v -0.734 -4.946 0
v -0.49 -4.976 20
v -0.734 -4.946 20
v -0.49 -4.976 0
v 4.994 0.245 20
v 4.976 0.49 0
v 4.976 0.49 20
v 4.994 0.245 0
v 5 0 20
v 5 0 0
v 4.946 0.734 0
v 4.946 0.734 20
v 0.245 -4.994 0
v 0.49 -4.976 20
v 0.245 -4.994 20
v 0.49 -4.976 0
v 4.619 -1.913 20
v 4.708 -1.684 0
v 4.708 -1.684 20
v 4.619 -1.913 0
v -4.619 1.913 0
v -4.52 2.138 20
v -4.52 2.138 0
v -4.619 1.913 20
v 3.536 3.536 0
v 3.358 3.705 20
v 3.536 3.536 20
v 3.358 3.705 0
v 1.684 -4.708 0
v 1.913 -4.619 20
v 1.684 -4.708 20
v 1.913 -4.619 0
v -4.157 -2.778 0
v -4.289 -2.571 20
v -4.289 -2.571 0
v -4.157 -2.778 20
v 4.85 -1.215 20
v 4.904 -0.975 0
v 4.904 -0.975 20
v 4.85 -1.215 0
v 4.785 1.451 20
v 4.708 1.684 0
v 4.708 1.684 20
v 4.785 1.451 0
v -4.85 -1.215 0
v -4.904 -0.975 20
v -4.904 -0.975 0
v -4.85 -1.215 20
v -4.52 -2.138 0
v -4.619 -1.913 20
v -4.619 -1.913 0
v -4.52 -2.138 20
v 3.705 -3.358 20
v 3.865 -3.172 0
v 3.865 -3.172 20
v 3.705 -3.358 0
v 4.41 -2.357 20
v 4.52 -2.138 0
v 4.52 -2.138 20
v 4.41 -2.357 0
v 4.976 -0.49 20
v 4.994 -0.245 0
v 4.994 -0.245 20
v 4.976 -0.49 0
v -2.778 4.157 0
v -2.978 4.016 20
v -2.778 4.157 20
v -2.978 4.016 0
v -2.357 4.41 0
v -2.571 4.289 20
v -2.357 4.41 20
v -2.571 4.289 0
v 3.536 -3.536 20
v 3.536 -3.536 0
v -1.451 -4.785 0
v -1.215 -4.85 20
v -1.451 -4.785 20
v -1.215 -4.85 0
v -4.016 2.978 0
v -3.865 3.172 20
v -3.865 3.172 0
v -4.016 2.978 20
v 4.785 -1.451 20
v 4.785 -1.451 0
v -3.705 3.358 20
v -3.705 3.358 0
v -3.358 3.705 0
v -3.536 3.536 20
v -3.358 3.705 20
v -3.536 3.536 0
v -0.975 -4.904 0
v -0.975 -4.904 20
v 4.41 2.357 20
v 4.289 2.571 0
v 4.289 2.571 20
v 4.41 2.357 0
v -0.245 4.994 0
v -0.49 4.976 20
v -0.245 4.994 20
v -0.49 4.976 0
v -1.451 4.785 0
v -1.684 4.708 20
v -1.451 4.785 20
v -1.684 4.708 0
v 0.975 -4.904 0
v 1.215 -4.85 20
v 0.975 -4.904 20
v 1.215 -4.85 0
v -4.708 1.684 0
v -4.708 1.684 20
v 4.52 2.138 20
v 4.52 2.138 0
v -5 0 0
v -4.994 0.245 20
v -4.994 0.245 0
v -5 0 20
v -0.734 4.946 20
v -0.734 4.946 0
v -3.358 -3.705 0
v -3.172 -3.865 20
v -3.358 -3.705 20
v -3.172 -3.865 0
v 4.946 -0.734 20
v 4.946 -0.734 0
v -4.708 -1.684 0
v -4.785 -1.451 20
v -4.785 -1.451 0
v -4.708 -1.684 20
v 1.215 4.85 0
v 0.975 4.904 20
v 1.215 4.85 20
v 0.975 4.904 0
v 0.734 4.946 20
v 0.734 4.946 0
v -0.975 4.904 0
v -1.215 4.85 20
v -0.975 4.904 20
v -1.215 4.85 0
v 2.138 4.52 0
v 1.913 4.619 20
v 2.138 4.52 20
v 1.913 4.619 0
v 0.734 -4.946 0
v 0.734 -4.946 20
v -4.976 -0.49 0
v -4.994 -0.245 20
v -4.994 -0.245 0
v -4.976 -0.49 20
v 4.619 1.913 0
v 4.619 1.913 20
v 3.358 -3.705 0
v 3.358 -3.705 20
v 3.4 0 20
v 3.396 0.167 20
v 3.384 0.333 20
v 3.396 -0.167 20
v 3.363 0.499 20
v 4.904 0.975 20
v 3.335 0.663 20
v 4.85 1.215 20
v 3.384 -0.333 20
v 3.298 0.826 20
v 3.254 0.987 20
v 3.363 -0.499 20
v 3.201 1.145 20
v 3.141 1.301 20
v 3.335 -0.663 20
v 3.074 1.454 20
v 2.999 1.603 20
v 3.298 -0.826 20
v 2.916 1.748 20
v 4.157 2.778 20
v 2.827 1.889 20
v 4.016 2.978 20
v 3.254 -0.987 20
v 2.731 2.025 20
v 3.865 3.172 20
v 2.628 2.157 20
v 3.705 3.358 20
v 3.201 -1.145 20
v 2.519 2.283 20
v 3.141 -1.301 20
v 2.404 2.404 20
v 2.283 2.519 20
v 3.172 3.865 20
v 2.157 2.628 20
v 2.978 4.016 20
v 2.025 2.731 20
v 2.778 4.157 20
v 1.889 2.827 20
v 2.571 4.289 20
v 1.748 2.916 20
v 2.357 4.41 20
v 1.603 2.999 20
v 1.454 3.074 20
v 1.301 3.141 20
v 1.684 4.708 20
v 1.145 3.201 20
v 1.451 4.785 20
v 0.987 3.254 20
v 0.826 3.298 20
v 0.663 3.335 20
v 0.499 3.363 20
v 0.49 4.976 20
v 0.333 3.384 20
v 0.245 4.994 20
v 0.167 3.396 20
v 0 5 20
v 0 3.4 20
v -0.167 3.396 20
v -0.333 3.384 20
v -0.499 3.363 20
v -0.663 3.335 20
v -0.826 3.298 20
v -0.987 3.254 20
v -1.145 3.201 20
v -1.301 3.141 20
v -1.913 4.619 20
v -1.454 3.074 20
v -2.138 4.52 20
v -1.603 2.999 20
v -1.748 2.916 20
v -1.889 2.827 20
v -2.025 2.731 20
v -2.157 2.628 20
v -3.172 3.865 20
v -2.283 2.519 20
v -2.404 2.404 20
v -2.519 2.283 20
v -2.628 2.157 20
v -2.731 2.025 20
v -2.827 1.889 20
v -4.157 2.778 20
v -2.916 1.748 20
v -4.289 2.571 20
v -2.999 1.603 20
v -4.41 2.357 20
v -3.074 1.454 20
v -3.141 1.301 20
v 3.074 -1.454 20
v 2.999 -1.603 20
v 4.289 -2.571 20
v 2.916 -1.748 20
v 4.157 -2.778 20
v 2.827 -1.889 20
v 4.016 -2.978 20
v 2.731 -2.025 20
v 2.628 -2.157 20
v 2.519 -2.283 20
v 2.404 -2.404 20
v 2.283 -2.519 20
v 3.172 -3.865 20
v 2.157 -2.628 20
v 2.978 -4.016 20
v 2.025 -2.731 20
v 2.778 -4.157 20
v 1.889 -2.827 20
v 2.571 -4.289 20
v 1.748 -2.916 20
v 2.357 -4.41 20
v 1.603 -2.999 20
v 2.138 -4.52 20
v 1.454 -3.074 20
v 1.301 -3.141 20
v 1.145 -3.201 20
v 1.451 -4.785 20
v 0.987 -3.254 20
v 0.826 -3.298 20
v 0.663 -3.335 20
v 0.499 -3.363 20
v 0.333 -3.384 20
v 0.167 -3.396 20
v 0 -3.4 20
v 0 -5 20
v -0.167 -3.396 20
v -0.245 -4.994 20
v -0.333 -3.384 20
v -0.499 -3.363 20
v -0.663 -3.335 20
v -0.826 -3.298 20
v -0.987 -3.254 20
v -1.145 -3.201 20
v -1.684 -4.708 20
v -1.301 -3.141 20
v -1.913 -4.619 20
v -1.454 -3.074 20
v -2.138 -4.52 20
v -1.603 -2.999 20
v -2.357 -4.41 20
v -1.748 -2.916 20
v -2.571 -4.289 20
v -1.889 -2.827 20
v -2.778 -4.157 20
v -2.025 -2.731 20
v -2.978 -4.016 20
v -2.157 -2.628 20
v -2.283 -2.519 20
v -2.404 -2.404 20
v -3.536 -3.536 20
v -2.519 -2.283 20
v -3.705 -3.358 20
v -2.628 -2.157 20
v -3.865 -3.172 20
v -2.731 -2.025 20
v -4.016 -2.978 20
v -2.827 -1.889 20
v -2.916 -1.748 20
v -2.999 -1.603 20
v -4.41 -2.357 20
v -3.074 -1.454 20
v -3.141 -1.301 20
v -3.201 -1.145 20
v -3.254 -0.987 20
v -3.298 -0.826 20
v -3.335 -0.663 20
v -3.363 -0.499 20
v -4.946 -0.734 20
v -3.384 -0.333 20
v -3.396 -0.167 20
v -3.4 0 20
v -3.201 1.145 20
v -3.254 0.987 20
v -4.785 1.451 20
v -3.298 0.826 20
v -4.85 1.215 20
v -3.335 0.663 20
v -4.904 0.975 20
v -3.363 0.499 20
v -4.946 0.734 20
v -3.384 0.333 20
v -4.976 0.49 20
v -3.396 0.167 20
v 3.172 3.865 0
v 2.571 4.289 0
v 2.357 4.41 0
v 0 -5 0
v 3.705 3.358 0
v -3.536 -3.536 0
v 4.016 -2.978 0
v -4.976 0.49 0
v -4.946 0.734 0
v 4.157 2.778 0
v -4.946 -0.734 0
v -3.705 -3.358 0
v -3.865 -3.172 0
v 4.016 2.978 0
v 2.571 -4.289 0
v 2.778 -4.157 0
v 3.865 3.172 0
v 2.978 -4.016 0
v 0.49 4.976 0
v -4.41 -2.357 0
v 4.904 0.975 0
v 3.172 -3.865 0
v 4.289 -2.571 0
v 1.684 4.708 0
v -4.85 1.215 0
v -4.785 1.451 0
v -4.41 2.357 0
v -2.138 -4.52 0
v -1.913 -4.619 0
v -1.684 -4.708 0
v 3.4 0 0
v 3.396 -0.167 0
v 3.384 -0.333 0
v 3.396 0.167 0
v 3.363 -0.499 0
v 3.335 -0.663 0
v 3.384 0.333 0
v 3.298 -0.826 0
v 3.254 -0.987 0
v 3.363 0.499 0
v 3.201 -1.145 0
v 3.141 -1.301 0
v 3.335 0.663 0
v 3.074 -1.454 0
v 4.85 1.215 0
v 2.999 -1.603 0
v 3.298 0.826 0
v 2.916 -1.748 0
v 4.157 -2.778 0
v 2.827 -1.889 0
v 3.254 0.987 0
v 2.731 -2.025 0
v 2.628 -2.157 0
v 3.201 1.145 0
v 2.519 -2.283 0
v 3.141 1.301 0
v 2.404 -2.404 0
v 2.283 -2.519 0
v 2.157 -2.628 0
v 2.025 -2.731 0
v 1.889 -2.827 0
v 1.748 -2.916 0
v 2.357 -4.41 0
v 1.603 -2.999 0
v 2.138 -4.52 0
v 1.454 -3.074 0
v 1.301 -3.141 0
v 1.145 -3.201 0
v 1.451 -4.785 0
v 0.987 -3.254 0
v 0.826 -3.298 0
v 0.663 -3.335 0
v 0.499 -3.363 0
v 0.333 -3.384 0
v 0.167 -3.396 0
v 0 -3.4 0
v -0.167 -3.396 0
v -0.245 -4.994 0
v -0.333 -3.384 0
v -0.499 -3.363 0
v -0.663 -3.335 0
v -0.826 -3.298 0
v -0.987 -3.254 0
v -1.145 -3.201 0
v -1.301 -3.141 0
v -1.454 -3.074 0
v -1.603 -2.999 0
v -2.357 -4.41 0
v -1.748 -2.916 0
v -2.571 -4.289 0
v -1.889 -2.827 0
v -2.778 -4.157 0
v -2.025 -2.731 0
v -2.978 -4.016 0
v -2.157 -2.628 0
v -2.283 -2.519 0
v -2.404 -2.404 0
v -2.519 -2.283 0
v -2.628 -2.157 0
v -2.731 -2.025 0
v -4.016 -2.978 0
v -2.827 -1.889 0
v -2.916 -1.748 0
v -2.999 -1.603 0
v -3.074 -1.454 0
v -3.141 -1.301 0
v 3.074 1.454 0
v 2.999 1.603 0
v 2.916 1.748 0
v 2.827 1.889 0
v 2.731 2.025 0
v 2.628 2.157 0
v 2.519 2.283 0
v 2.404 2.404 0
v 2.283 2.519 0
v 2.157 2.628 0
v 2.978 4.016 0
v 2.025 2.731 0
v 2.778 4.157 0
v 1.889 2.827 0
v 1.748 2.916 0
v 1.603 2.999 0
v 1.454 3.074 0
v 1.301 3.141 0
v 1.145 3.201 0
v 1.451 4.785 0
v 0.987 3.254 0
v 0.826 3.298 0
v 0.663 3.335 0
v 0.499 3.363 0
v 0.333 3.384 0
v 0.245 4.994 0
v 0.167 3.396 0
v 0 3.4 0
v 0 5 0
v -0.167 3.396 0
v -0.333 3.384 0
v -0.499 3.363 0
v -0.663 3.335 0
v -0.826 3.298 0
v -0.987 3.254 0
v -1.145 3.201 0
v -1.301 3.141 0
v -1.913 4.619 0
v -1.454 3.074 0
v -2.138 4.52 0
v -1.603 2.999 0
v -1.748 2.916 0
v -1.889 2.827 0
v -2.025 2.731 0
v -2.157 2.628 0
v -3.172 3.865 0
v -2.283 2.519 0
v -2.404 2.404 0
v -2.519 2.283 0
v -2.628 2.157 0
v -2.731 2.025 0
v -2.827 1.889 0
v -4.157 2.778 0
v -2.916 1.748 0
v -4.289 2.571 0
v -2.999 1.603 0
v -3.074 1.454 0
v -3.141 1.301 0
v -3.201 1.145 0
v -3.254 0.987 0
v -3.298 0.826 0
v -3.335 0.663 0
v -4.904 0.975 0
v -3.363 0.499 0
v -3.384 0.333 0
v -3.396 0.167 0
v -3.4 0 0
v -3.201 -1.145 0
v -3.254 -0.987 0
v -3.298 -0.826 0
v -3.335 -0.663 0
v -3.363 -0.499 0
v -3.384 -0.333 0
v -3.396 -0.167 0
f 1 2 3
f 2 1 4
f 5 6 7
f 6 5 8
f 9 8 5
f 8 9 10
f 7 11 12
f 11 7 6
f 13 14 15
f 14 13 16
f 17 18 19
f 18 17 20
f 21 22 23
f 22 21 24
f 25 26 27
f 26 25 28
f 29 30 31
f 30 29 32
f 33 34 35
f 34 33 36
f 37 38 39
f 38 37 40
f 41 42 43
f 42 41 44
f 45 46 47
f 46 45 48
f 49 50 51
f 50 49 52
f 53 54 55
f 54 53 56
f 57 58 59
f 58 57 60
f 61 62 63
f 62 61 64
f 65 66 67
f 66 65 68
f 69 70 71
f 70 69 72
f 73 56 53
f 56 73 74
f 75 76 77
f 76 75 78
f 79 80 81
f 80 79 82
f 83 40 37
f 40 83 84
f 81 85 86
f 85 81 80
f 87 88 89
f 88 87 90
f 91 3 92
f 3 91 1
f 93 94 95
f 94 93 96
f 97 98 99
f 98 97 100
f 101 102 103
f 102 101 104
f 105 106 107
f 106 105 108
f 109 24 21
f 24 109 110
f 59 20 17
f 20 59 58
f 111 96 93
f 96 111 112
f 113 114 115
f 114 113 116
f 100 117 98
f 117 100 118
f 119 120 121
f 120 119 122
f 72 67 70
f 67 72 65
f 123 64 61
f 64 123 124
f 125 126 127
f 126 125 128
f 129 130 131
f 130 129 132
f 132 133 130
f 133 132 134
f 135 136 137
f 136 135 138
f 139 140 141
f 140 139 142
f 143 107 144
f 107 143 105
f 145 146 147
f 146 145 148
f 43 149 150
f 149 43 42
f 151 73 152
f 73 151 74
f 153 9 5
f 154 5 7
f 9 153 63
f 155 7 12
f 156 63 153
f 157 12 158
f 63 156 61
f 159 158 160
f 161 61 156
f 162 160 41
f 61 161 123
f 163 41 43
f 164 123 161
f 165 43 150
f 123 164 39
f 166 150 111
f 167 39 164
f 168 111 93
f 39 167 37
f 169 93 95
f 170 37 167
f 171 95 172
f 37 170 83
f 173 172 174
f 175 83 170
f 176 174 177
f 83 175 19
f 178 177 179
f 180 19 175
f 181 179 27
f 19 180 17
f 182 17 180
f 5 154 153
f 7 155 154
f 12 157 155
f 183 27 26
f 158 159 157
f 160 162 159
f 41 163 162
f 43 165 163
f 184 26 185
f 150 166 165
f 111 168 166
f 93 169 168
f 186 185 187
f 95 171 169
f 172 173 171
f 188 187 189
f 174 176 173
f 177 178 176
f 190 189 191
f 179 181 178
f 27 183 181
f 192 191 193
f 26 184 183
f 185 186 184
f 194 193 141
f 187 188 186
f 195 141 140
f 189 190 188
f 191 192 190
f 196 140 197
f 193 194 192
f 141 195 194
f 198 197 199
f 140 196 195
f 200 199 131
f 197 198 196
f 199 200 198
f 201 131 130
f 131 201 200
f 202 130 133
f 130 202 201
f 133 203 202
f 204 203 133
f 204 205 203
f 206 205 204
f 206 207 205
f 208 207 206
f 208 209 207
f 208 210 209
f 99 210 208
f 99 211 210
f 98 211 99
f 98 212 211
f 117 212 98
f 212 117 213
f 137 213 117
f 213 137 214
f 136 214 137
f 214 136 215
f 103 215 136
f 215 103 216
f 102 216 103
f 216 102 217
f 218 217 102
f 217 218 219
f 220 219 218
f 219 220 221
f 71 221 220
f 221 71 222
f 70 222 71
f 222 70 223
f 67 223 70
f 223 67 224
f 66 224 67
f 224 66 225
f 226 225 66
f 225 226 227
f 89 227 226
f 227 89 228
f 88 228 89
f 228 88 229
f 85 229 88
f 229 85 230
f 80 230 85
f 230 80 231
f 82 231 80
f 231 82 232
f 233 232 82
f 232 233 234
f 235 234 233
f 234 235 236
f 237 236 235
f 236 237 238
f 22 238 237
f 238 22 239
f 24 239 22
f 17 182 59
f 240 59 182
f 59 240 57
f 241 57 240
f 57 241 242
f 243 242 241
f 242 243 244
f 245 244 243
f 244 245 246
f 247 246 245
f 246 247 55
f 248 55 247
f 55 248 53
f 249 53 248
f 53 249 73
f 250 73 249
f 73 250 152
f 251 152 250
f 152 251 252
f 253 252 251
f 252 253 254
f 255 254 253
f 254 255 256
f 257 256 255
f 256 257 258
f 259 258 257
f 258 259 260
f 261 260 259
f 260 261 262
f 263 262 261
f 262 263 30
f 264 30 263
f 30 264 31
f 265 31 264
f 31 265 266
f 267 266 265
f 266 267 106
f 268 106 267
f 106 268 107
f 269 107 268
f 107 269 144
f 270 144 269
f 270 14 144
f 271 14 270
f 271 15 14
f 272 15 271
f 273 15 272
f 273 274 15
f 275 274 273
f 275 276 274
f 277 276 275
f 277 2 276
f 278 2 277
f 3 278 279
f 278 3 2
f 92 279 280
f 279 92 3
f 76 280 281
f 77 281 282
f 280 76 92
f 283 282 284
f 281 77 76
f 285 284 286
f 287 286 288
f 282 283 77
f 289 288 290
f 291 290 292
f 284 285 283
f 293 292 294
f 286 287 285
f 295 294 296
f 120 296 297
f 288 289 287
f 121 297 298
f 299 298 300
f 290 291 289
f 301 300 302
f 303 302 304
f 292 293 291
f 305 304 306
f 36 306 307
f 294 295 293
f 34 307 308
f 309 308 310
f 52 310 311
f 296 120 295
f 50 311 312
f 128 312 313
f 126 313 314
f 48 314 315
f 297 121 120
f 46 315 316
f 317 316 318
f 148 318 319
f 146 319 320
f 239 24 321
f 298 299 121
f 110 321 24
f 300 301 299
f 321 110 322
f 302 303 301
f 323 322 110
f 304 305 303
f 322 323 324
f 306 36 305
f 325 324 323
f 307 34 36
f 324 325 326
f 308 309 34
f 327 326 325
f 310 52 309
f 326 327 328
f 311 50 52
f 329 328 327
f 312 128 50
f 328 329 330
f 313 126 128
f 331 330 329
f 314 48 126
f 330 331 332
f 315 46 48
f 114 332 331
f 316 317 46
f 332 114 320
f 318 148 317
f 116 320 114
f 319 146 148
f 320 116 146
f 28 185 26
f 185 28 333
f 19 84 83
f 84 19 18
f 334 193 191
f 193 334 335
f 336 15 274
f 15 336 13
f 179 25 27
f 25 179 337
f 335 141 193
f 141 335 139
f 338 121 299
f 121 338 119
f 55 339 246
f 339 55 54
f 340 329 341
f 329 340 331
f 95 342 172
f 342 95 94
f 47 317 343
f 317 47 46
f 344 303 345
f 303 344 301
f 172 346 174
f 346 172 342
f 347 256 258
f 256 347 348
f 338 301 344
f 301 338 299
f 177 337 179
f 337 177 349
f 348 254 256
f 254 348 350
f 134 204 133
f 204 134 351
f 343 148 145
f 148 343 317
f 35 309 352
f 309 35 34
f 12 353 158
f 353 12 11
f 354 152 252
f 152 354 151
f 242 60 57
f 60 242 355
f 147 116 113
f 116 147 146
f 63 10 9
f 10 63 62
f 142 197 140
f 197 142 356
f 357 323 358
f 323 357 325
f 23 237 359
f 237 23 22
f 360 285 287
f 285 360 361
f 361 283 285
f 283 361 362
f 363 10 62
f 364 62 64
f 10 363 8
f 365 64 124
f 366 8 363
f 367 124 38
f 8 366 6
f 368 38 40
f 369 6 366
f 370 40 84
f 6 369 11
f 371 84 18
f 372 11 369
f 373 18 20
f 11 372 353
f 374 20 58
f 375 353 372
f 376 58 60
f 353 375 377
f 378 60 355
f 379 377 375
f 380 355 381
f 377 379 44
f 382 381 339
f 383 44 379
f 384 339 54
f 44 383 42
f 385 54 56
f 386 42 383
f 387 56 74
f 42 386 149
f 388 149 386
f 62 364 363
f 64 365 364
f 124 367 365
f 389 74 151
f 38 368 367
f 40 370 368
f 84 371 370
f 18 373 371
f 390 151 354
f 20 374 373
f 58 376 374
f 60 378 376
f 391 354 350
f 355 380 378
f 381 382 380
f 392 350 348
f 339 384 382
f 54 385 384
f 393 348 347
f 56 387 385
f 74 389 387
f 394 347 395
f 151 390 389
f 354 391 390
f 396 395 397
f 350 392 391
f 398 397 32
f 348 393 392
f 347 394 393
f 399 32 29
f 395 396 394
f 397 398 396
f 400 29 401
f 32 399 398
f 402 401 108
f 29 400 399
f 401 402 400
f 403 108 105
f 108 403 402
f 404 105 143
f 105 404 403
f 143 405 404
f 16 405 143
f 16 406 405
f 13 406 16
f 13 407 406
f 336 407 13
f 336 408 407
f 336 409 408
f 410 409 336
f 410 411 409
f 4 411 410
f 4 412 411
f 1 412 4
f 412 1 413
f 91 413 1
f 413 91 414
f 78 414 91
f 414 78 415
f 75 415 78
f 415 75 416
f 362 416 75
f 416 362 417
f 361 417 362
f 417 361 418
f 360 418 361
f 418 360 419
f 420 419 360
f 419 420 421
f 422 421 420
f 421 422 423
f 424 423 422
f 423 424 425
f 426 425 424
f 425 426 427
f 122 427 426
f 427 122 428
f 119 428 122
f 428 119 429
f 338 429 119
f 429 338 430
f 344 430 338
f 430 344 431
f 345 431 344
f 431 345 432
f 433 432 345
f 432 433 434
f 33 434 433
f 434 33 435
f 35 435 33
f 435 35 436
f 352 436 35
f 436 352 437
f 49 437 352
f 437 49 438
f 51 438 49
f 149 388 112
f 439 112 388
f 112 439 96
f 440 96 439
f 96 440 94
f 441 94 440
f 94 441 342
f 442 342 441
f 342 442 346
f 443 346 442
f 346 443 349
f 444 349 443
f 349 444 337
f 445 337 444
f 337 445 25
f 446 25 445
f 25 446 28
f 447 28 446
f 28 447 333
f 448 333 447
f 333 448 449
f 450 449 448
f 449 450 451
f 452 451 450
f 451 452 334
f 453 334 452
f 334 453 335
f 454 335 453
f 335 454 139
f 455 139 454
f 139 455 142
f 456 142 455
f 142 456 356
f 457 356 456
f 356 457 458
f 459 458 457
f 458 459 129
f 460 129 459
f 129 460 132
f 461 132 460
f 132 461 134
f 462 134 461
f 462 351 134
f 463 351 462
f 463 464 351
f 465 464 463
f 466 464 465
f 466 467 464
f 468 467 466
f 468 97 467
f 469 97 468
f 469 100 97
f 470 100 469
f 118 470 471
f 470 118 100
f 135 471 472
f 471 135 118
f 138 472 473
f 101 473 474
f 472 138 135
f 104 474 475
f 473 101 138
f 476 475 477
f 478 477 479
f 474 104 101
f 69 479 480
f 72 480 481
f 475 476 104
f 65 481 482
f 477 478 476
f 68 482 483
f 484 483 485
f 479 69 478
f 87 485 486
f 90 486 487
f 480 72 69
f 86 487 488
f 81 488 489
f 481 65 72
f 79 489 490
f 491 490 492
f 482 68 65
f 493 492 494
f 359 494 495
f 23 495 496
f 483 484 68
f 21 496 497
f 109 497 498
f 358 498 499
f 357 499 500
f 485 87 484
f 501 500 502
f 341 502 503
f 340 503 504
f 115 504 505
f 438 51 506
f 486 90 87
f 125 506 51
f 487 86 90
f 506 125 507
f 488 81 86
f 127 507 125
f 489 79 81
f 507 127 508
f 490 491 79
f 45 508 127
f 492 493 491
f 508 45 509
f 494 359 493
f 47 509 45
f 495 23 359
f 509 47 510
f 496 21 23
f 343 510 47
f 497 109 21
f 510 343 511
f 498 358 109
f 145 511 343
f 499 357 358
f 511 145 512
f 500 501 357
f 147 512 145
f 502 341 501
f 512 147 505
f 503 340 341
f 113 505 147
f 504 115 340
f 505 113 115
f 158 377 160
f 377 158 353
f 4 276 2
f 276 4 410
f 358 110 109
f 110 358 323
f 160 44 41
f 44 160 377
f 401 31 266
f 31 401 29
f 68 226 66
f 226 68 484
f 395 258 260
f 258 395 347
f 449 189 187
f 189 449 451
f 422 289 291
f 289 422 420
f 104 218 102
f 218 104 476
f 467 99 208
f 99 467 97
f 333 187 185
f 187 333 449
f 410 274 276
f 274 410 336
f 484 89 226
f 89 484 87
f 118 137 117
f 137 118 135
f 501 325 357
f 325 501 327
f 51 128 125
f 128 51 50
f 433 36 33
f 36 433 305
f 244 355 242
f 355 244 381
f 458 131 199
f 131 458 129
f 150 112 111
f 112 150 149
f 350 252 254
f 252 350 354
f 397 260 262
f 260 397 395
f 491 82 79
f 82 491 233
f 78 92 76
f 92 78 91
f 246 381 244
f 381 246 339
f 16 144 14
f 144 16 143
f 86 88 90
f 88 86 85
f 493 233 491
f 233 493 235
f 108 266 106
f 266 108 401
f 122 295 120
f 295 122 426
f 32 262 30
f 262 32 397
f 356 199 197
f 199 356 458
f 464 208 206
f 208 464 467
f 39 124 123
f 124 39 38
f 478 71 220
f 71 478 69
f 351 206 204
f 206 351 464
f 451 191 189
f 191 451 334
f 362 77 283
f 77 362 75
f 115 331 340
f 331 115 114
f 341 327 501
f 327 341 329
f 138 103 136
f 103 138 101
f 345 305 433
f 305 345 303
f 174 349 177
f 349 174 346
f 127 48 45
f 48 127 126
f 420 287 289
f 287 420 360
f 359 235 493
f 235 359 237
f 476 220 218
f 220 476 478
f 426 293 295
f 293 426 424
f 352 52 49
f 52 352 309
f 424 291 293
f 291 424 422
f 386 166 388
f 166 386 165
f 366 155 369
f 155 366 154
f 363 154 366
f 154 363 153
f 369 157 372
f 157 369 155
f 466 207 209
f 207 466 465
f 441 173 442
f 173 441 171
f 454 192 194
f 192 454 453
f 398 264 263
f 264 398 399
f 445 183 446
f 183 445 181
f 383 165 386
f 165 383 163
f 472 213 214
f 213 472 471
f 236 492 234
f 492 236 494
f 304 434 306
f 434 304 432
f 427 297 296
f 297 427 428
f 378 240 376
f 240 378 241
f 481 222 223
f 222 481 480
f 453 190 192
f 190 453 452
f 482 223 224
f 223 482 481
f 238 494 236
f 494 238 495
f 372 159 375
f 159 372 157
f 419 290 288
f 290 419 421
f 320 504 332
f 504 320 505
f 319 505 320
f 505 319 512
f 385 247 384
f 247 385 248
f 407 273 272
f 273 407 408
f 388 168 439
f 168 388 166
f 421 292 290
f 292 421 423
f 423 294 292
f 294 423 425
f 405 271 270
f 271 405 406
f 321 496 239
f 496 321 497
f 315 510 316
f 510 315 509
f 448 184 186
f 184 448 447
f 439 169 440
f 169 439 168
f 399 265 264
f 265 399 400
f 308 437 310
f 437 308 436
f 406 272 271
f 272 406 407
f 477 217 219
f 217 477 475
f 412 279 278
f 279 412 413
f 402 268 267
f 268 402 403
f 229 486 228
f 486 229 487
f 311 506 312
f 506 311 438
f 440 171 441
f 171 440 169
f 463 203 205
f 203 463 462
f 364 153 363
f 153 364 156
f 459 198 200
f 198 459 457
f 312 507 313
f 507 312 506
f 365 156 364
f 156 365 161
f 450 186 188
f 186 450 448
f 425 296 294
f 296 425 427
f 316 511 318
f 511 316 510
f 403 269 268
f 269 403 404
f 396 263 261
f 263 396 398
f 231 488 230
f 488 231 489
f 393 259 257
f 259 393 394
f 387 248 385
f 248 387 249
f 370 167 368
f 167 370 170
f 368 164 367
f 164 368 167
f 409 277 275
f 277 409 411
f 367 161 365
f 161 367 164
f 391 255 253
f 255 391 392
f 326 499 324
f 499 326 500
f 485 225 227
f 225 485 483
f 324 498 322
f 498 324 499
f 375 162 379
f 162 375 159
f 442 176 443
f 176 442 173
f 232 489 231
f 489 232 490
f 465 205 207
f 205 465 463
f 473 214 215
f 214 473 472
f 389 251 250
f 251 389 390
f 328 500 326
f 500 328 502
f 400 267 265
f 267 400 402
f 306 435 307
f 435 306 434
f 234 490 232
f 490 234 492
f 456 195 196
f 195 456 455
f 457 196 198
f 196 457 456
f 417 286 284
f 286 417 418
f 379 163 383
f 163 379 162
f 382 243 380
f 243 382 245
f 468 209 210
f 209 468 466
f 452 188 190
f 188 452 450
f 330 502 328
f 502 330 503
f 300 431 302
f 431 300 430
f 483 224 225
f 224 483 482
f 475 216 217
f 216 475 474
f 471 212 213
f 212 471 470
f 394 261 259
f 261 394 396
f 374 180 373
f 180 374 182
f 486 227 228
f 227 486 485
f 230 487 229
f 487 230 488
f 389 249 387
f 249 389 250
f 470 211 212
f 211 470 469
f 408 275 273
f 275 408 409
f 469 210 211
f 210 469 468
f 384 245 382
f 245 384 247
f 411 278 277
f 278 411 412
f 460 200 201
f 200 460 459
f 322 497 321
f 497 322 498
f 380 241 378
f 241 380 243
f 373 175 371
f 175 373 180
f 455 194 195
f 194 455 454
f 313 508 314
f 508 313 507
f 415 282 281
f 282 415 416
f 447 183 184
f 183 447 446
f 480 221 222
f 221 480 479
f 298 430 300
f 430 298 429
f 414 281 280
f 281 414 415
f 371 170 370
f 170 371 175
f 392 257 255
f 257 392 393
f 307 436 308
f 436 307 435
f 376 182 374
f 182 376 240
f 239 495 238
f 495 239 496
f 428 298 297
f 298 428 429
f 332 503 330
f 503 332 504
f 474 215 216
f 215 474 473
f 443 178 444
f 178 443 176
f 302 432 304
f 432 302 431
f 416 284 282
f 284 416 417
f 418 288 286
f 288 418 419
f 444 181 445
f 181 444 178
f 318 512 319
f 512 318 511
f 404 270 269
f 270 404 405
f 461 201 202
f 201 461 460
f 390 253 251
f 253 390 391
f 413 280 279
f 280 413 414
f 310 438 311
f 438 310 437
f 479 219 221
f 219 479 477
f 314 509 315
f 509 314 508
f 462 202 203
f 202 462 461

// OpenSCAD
// Small lab funnel - printed upright, open top and bottom
// Units: mm. One complete part, no external libraries.

// ---- Parameters ----
spout_od      = 10;    // spout outer diameter
spout_length  = 20;    // spout runs from z = 0 to z = 20
cone_base_d   = 60;    // cone rim (base) outer diameter at z = 50
cone_top_d    = 10;    // cone outer diameter where it meets the spout (z = 20)
cone_height   = 30;    // cone runs from z = 20 to z = 50 (50 - 20)
wall          = 1.6;   // uniform wall thickness for spout and cone
eps           = 0.5;   // cutter overshoot past faces

$fn = 128;             // smoothness of curved surfaces

// ---- Derived ----
spout_id = spout_od - 2 * wall;   // spout bore diameter (6.8 mm)
// ---- Model ----
union() {
    // Straight spout: tube from z = 0 to z = 20
    difference() {
        cylinder(d = spout_od, h = spout_length);
        translate([0, 0, -eps])
            cylinder(d = spout_id, h = spout_length + 2 * eps);
    }

    // Cone: widens from 10 mm at z = 20 to 60 mm at z = 50
    // rotate_extrude maps 2D y -> z, so the profile spans z = 20..50
    rotate_extrude()
        translate([0, cone_top_d / 2, cone_height])
            difference() {
                circle(d = cone_base_d);
                translate([0, -eps])
                    circle(d = cone_base_d - 2 * wall);
            }
}
